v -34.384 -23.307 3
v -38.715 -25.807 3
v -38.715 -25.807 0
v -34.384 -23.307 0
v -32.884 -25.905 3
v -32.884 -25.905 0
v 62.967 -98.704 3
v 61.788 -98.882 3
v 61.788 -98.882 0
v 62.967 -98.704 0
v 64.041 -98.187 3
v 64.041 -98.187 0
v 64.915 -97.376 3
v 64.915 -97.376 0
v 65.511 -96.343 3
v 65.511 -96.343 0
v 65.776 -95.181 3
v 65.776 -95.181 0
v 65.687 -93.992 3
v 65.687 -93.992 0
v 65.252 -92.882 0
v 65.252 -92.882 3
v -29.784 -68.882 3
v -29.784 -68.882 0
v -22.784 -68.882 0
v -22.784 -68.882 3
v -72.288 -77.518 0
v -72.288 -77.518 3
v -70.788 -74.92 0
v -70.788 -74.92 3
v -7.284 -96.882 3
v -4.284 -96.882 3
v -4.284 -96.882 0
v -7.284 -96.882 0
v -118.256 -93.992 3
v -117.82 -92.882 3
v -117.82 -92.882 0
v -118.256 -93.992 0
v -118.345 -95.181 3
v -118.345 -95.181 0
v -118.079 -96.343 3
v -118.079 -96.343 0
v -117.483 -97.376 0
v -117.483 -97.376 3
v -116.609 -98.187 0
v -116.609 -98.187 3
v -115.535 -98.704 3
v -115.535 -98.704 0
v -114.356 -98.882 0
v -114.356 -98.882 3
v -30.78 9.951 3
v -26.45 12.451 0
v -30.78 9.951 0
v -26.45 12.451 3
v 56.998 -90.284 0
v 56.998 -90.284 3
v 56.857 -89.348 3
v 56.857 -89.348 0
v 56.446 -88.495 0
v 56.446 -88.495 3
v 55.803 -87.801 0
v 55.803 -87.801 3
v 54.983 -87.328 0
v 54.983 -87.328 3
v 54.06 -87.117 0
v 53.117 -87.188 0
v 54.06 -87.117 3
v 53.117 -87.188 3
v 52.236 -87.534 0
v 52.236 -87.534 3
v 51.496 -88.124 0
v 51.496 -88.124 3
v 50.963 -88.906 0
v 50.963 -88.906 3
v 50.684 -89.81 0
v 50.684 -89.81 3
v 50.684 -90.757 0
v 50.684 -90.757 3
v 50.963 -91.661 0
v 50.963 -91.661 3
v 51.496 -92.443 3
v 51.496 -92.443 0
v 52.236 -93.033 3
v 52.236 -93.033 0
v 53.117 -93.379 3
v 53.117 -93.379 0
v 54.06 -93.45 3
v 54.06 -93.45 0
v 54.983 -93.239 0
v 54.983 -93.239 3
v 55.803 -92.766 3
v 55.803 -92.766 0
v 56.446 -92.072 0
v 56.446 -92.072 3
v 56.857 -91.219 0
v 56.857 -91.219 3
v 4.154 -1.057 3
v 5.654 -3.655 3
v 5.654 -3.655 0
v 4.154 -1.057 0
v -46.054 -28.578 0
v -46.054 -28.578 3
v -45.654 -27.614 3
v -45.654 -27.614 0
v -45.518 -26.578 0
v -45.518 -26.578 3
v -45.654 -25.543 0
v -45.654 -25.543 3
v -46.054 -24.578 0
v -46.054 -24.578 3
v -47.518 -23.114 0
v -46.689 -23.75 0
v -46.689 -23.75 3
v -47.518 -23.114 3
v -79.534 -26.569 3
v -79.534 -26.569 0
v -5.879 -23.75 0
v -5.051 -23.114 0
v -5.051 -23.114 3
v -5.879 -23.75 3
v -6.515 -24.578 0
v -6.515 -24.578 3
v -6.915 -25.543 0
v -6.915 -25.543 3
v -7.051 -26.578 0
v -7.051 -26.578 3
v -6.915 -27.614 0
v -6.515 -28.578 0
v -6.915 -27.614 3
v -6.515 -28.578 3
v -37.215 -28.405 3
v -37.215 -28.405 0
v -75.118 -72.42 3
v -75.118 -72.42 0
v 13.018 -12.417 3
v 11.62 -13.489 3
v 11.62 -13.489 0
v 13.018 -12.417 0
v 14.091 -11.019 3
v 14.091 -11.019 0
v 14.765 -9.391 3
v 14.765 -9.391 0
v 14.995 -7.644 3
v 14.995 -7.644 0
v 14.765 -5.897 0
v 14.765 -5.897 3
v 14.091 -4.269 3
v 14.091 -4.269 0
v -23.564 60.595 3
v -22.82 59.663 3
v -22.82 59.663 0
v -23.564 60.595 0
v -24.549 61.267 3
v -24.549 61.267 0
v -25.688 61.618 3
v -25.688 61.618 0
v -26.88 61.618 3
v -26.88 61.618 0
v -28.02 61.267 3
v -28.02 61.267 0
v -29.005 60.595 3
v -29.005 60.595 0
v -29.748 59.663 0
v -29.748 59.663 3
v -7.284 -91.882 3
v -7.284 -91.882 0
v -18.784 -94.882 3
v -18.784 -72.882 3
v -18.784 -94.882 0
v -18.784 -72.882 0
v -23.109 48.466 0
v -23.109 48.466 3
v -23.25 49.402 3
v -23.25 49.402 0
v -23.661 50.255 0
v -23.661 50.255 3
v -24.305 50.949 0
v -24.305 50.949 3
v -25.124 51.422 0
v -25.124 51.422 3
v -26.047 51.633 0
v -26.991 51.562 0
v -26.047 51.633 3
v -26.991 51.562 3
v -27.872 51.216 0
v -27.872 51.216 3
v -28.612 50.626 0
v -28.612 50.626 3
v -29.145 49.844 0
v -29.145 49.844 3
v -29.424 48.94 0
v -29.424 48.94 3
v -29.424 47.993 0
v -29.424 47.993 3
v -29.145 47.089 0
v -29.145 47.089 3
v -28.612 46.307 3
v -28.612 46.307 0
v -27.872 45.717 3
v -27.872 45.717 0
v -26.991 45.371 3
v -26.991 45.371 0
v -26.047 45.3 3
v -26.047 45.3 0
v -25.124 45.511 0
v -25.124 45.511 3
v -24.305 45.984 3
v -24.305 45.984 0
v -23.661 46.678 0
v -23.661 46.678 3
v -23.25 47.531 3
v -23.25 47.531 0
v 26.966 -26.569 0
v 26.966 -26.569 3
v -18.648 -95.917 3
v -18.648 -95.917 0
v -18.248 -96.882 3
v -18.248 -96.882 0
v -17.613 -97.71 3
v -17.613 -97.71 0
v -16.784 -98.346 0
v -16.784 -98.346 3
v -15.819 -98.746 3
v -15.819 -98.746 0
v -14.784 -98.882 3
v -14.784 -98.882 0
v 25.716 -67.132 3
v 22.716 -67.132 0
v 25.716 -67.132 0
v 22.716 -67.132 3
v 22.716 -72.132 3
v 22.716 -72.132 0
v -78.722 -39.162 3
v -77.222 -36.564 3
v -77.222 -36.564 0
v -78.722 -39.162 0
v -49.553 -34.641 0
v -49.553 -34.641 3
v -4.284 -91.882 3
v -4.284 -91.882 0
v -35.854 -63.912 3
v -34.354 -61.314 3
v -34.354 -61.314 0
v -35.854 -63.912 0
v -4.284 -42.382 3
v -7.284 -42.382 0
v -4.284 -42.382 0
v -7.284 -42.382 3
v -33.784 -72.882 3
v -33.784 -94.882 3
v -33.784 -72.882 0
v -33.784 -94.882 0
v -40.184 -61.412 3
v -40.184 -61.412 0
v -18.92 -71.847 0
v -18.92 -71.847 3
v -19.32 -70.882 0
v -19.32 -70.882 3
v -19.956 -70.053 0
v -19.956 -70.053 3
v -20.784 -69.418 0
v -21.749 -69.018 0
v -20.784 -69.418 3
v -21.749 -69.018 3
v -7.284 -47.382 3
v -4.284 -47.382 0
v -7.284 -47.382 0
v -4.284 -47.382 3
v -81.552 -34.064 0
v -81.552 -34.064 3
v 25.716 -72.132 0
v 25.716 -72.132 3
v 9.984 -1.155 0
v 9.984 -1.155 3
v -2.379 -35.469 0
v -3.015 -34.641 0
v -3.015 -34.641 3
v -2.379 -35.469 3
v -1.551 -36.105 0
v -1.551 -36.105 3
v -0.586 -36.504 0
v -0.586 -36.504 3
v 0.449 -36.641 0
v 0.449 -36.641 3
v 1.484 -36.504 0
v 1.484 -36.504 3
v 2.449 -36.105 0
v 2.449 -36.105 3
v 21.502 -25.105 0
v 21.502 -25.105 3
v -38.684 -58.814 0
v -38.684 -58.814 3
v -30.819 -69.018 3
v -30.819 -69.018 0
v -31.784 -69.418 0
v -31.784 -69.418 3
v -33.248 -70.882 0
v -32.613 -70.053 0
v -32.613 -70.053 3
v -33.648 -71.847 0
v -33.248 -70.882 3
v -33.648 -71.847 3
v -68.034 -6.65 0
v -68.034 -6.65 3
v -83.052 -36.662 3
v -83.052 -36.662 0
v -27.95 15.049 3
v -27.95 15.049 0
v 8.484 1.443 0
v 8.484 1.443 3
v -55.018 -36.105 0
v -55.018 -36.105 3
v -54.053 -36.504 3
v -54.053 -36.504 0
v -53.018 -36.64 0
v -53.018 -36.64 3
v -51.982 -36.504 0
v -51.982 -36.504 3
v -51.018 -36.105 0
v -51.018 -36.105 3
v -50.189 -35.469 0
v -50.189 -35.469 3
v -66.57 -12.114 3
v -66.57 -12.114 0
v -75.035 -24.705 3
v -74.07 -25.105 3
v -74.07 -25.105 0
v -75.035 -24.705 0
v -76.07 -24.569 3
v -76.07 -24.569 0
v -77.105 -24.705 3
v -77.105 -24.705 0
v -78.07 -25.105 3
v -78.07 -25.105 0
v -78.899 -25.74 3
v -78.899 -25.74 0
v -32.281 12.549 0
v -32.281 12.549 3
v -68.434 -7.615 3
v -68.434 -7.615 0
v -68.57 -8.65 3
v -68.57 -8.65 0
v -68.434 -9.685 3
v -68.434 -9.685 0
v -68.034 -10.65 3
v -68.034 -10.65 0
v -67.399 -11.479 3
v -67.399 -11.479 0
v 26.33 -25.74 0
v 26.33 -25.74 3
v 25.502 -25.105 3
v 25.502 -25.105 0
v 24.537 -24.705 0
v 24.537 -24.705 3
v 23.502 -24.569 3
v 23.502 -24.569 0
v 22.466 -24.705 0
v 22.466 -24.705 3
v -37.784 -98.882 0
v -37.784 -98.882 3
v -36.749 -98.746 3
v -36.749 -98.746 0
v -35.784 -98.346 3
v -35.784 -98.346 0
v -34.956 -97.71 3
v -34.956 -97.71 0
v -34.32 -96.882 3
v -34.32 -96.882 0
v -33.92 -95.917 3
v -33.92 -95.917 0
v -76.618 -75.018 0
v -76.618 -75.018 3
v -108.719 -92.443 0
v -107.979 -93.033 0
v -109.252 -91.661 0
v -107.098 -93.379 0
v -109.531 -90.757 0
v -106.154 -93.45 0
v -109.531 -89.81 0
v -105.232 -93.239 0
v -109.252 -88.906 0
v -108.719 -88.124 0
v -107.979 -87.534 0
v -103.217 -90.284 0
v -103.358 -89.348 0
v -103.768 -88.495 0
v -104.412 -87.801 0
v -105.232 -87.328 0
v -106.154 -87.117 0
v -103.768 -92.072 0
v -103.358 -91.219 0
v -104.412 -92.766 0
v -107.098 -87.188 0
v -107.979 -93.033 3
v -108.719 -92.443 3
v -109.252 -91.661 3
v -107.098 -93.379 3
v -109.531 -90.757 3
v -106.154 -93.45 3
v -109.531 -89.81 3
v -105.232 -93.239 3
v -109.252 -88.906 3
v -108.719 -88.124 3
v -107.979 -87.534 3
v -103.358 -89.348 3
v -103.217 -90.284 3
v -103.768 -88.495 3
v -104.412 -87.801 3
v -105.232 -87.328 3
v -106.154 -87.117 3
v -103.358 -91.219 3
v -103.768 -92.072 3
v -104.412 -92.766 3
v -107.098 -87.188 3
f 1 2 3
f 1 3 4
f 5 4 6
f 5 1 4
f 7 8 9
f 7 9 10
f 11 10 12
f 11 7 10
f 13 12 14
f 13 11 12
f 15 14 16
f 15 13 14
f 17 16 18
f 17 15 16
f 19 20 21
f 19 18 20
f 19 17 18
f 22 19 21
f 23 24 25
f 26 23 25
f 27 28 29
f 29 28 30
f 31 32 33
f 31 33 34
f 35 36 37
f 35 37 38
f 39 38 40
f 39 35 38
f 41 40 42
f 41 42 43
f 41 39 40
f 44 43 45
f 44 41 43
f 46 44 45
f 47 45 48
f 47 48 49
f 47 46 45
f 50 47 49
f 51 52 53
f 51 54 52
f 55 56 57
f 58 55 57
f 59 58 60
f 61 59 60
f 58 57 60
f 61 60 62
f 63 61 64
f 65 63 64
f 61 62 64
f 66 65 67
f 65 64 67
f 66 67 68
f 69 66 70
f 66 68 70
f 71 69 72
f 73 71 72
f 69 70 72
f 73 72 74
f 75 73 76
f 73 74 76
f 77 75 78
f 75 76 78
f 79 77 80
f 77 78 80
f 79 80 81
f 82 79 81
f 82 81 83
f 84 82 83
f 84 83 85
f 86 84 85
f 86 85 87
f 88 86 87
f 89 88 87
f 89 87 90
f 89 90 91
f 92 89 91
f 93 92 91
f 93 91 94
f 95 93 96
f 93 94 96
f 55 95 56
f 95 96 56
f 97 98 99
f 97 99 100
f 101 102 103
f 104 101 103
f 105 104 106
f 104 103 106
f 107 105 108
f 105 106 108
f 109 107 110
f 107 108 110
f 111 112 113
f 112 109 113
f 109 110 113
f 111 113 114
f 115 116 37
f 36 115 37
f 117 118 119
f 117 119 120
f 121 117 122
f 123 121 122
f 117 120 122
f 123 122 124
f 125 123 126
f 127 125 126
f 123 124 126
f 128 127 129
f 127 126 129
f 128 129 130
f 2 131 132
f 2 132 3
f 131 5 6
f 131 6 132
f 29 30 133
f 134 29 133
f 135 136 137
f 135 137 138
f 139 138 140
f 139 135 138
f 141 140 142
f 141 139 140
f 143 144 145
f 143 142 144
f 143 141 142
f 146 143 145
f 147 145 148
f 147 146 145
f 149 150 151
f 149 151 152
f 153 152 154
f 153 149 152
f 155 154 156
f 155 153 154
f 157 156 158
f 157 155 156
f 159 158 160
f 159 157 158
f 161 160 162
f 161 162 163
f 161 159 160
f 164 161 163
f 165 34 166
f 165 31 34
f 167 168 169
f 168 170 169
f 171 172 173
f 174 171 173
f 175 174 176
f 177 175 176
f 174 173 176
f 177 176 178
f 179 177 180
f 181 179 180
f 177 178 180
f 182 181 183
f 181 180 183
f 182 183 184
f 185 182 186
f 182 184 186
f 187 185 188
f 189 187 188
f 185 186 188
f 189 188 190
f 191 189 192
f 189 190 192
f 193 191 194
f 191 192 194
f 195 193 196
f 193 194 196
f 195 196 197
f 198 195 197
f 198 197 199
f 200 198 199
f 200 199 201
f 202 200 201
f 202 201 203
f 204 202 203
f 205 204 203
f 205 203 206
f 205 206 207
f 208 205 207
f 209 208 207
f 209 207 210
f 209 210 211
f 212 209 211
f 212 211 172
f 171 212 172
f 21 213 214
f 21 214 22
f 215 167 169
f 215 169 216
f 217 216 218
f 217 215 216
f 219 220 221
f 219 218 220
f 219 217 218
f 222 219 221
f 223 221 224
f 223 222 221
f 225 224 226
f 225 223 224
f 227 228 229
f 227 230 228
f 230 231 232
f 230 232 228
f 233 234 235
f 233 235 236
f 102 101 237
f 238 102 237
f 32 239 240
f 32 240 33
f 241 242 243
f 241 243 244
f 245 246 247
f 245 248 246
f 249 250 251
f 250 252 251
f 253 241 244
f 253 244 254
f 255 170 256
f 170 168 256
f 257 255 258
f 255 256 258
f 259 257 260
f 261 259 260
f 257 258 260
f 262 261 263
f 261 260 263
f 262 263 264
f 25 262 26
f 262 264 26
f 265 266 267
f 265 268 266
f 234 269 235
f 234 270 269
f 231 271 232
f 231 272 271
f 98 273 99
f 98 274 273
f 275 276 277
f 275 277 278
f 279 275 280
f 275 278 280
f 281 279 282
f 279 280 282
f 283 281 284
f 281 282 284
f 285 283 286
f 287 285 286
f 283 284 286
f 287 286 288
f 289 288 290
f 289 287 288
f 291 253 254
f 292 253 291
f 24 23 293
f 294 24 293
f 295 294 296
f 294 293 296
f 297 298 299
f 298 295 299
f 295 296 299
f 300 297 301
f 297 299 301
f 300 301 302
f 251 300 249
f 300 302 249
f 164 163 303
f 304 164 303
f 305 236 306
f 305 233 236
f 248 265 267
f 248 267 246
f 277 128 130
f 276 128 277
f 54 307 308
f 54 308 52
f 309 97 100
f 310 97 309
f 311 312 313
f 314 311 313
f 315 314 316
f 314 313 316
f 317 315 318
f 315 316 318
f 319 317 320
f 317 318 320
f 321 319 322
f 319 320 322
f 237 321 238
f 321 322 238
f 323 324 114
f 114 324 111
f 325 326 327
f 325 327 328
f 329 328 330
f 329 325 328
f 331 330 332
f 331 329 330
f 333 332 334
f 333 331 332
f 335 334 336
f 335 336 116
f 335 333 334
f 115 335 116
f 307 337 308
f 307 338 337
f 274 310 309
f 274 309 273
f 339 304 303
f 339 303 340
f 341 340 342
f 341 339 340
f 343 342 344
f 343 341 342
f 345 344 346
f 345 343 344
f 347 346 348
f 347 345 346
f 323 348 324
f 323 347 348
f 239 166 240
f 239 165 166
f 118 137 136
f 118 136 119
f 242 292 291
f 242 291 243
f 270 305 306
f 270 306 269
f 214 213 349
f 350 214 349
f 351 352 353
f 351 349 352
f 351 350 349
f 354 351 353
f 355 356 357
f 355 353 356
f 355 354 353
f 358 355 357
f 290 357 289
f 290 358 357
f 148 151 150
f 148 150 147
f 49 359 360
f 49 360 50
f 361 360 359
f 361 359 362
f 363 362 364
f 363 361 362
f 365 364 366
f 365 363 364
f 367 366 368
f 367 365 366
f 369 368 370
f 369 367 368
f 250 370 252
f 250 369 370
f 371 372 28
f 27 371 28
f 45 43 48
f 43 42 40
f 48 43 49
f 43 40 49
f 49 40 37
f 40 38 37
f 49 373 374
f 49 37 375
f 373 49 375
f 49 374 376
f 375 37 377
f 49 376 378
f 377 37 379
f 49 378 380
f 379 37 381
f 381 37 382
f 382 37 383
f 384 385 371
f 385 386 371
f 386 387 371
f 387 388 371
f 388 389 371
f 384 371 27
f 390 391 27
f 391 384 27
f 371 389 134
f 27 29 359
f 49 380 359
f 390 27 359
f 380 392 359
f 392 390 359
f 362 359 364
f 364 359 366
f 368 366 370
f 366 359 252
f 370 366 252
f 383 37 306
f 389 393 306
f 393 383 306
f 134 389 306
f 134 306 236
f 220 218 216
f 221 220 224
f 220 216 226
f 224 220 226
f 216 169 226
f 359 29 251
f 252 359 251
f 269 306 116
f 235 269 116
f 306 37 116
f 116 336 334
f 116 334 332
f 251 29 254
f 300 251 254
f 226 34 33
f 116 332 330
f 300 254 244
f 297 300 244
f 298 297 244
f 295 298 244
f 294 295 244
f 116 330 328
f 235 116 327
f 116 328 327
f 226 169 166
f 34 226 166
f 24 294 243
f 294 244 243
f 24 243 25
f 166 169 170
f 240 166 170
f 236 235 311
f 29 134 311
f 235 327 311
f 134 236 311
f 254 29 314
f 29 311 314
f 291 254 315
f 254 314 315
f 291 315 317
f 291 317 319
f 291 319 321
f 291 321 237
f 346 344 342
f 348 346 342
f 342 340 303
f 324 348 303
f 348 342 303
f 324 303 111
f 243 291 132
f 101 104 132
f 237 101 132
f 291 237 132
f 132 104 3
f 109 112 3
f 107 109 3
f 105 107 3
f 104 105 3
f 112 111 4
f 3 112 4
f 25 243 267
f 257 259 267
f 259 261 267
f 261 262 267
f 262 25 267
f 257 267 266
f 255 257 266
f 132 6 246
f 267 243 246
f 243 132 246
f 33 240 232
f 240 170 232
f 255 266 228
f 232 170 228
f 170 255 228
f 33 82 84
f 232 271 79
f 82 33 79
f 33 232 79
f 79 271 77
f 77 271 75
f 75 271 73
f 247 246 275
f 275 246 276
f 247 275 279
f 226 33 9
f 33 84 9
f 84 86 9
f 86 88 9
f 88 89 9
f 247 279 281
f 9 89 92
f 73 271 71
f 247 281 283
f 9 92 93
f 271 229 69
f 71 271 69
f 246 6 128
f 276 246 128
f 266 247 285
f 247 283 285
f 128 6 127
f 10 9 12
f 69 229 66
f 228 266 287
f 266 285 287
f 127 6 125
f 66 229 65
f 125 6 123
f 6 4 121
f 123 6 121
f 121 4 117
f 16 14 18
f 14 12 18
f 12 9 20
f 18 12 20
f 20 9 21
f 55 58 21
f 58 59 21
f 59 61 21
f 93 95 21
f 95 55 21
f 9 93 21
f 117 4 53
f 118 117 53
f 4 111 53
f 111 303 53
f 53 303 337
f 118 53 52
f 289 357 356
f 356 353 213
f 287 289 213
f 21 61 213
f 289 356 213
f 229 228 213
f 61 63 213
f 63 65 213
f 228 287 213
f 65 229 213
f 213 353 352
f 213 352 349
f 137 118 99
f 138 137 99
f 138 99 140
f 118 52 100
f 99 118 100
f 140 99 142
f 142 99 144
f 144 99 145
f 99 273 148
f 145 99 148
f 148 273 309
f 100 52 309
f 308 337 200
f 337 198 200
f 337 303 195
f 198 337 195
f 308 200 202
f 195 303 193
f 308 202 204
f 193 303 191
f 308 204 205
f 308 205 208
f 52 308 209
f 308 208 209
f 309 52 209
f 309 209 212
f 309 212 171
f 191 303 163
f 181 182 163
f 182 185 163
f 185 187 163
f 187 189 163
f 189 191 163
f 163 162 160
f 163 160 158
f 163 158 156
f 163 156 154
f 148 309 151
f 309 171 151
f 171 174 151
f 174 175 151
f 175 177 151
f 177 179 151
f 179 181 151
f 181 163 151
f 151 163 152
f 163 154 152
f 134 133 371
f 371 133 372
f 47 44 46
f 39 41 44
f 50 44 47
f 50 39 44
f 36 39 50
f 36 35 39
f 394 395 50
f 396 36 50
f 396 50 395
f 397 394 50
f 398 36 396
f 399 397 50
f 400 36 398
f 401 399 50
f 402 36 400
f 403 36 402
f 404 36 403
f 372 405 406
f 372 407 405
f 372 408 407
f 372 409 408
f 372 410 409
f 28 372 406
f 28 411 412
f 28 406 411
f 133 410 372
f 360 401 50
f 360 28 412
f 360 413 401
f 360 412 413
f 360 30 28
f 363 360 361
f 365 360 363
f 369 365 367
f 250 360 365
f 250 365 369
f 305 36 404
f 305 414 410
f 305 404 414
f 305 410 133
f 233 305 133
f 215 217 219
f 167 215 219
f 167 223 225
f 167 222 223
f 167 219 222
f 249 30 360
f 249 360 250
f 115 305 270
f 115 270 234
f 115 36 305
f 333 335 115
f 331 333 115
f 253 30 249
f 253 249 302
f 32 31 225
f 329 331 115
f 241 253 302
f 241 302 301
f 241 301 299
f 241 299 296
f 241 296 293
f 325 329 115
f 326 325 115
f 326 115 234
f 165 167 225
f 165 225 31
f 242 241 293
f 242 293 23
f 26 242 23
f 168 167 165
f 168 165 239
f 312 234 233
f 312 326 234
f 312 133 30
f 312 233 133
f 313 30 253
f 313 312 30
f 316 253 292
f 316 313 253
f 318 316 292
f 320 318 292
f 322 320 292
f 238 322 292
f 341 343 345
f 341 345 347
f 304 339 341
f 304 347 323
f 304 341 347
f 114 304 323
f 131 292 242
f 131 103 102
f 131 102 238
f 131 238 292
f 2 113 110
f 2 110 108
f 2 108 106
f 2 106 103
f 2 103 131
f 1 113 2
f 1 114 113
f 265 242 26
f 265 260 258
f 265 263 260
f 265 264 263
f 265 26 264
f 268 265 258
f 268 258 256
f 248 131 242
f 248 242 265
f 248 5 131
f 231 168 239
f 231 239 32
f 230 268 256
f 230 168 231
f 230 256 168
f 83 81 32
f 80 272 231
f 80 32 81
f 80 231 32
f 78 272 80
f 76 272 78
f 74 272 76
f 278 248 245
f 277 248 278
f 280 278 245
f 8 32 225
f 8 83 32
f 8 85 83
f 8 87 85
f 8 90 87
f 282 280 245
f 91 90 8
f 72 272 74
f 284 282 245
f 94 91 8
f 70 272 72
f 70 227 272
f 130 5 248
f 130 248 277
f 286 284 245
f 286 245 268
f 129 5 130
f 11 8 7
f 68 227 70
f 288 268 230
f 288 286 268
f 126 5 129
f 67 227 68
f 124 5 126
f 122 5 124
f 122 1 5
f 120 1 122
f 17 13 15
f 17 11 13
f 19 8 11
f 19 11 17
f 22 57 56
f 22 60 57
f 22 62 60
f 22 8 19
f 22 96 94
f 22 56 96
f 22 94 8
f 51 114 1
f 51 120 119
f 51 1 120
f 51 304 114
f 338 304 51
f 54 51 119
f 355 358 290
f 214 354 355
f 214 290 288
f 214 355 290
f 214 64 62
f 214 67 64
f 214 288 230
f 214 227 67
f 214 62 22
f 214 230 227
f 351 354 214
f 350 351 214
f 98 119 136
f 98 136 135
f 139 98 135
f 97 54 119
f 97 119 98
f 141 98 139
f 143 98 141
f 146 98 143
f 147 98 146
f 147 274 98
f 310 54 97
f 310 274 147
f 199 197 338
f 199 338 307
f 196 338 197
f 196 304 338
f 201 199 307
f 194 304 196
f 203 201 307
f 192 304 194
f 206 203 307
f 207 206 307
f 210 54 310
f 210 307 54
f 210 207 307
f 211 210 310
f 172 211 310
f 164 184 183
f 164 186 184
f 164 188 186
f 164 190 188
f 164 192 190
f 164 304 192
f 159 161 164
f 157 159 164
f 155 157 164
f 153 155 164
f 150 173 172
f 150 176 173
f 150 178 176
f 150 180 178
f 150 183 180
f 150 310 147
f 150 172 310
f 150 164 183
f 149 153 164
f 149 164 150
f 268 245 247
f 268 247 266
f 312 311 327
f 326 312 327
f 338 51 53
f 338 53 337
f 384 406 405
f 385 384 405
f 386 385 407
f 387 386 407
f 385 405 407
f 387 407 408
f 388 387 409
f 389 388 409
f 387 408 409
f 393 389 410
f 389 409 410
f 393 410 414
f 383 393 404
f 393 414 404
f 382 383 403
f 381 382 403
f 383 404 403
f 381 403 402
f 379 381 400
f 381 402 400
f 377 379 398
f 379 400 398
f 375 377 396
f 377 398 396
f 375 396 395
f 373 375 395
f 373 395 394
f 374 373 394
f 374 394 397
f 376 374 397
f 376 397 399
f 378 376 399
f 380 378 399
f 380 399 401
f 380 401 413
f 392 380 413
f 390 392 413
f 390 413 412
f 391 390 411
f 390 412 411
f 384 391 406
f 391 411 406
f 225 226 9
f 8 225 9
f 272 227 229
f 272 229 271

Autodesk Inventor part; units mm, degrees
ref_plane "YZ Plane" through (0, 0, 0) normal (1, 0, 0) x (0, 1, 0)
ref_plane "XZ Plane" through (0, 0, 0) normal (0, 1, 0) x (-1, 0, 0)
ref_plane "XY Plane" through (0, 0, 0) normal (0, 0, 1) x (1, 0, 0)
sketch "Sketch1" plane through (0, 0, 0) normal (0, 0, 1) x (1, 0, 0)
  line L0 (68.7158, -98.8819) -> (-121.2842, -98.8819) construction
  line L1 (-121.2842, -98.8819) -> (-26.2842, 65.663) construction
  line L2 (-26.2842, 65.663) -> (-26.2842, -98.8819) construction
  line L3 (68.7158, -98.8819) -> (-73.7842, -16.6094) construction
  line L4 (-33.7842, -98.8819) -> (-33.7842, -68.8819)
  line L5 (-33.7842, -68.8819) -> (-18.7842, -68.8819)
  line L6 (-18.7842, -68.8819) -> (-18.7842, -98.8819)
  line L7 (-70.0342, -10.1143) -> (-44.0535, -25.1143)
  line L8 (-44.0535, -25.1143) -> (-51.5535, -38.1046)
  line L9 (-51.5535, -38.1046) -> (-77.5342, -23.1046)
  line L10 (-77.5342, -23.1046) -> (-121.2842, -98.8819)
  line L11 (-33.7842, -98.8819) -> (-121.2842, -98.8819)
  line L12 (-18.7842, -98.8819) -> (68.7158, -98.8819)
  line L13 (-26.2842, 65.663) -> (-70.0342, -10.1143)
  line L14 (-121.2842, -98.8819) -> (17.4658, -18.7745) construction
  line L15 (-26.2842, 65.663) -> (68.7158, -98.8819) construction
  line L16 (17.4658, -10.1143) -> (-8.515, -25.1143)
  line L17 (-8.515, -25.1143) -> (-1.015, -38.1046)
  line L18 (-1.015, -38.1046) -> (24.9658, -23.1046)
  line L19 (-26.2842, 65.663) -> (17.4658, -10.1143)
  line L20 (24.9658, -23.1046) -> (68.7158, -98.8819)
  point P0 (-26.2842, -44.0336)
  point P1 (-26.2842, -44.0336)
  dimension "d3" = 190
  dimension "d6" = 7.5
  dimension "d7" = 15
  dimension "d8" = 30
  dimension "d9" = 15
  dimension "d10" = 7.5
  dimension "d16" = 30
  dimension "d18" = 15
  dimension "d19" = 7.5
  dimension "d20" = 30
extrude "Extrusion2" add sketch "Sketch1" along normal blind 3
fillet "Fillet1" radius 6.75 1 edges at (17.4658, -10.1143, 1.5)
fillet "Fillet2" radius 4 14 edges at (-8.515, -25.1143, 1.5) (24.9658, -23.1046, 1.5) (-1.015, -38.1046, 1.5) (-33.7842, -98.8819, 1.5) (-33.7842, -68.8819, 1.5) (-18.7842, -98.8819, 1.5) (68.7158, -98.8819, 1.5) (-18.7842, -68.8819, 1.5) (-121.2842, -98.8819, 1.5) (-70.0342, -10.1143, 1.5) (-44.0535, -25.1143, 1.5) (-51.5535, -38.1046, 1.5) (-77.5342, -23.1046, 1.5) (-26.2842, 65.663, 1.5)
sketch "Sketch3" plane through (0, 0, 3) normal (0, 0, 1) x (1, 0, 0)
  line L0 (61.7876, -98.8819) -> (-14.7842, -98.8819) projected
  line L1 (-7.2842, -91.8819) -> (-4.2842, -91.8819)
  line L2 (-4.2842, -91.8819) -> (-4.2842, -96.8819)
  line L3 (-4.2842, -96.8819) -> (-7.2842, -96.8819)
  line L4 (-7.2842, -96.8819) -> (-7.2842, -91.8819)
  line L5 (-18.7842, -94.8819) -> (-18.7842, -72.8819) projected
  line L6 (-7.2842, -42.3819) -> (-4.2842, -42.3819)
  line L7 (-4.2842, -42.3819) -> (-4.2842, -47.3819)
  line L8 (-4.2842, -47.3819) -> (-7.2842, -47.3819)
  line L9 (-7.2842, -47.3819) -> (-7.2842, -42.3819)
  line L10 (-74.0701, -25.1046) -> (-55.0176, -36.1046) projected
  line L11 (-117.8201, -92.8819) -> (-79.5342, -26.5687) projected
  line L12 (11.6201, -13.4893) -> (-5.0509, -23.1143) projected
  line L13 (-22.8201, 59.663) -> (14.0908, -4.2686) projected
  line L14 (-34.3845, -23.3069) -> (-32.8845, -25.905)
  line L15 (-32.8845, -25.905) -> (-37.2146, -28.405)
  line L16 (-37.2146, -28.405) -> (-38.7146, -25.8069)
  line L17 (-38.7146, -25.8069) -> (-34.3845, -23.3069)
  line L18 (8.4837, 1.4431) -> (9.9837, -1.155)
  line L19 (9.9837, -1.155) -> (5.6536, -3.655)
  line L20 (5.6536, -3.655) -> (4.1536, -1.0569)
  line L21 (4.1536, -1.0569) -> (8.4837, 1.4431)
  line L22 (-40.1839, -61.412) -> (-38.6839, -58.8139)
  line L23 (-38.6839, -58.8139) -> (-34.3538, -61.3139)
  line L24 (-34.3538, -61.3139) -> (-35.8538, -63.912)
  line L25 (-35.8538, -63.912) -> (-40.1839, -61.412)
  line L26 (-83.0522, -36.662) -> (-81.5522, -34.0639)
  line L27 (-81.5522, -34.0639) -> (-77.222, -36.5639)
  line L28 (-77.222, -36.5639) -> (-78.722, -39.162)
  line L29 (-78.722, -39.162) -> (-83.0522, -36.662)
  line L30 (22.7158, -67.1319) -> (25.7158, -67.1319)
  line L31 (25.7158, -67.1319) -> (25.7158, -72.1319)
  line L32 (25.7158, -72.1319) -> (22.7158, -72.1319)
  line L33 (22.7158, -72.1319) -> (22.7158, -67.1319)
  line L34 (-49.5535, -34.6405) -> (-46.0535, -28.5784) projected
  line L35 (-6.515, -28.5784) -> (-3.015, -34.6405) projected
  line L36 (-30.7805, 9.9508) -> (-32.2805, 12.5489)
  line L37 (-32.2805, 12.5489) -> (-27.9504, 15.0489)
  line L38 (-27.9504, 15.0489) -> (-26.4504, 12.4508)
  line L39 (-26.4504, 12.4508) -> (-30.7805, 9.9508)
  line L40 (-75.118, -72.4197) -> (-76.618, -75.0178)
  line L41 (-76.618, -75.0178) -> (-72.2879, -77.5178)
  line L42 (-72.2879, -77.5178) -> (-70.7879, -74.9197)
  line L43 (-70.7879, -74.9197) -> (-75.118, -72.4197)
  line L44 (-68.0342, -6.6502) -> (-29.7483, 59.663) projected
  line L45 (-47.5176, -23.1143) -> (-66.5701, -12.1143) projected
  line L46 (26.9658, -26.5687) -> (65.2517, -92.8819) projected
  line L47 (-61.1393, 5.2922) -> (-129.5703, -113.2338) construction
  line L48 (-129.5703, -98.8819) -> (82.7932, -98.8819) construction
  line L49 (71.7222, -104.0892) -> (-26.7217, 66.4208) construction
  line L50 (-61.1393, 5.2922) -> (-24.7647, 68.2948) construction
  line L51 (-26.2842, 65.663) -> (-26.2842, -98.8819) construction
  line L52 (68.7158, -98.8819) -> (-73.7842, -16.6094) construction
  line L53 (-121.2842, -98.8819) -> (21.2158, -16.6094) construction
  circle A0 centre (-26.2842, -44.0336) radius 92.5 construction
  circle A1 centre (53.8231, -90.2836) radius 3.175
  circle A2 centre (-106.3916, -90.2836) radius 3.175
  circle A3 centre (-26.2842, 48.4664) radius 3.175
  point P0 (0, 0)
  dimension "d35" = 3
  dimension "d36" = 5
  dimension "d38" = 2
  dimension "d41" = 11.5
  dimension "d42" = 3
  dimension "d43" = 5
  dimension "d44" = 44.5
  dimension "d45" = 3
  dimension "d46" = 5
  dimension "d47" = 3
  dimension "d48" = 5
  dimension "d49" = 44.5
  dimension "d50" = 3
  dimension "d51" = 5
  dimension "d52" = 3
  dimension "d53" = 5
  dimension "d54" = 44.5
  dimension "d55" = 2
  dimension "d56" = 11.5
  dimension "d57" = 11.5
  dimension "d58" = 2
  dimension "d59" = 3
  dimension "d60" = 5
  dimension "d61" = 19.75
  dimension "d62" = 30
  dimension "d63" = 5
  dimension "d64" = 3
  dimension "d65" = 30
  dimension "d66" = 19.75
  dimension "d67" = 3
  dimension "d68" = 5
  dimension "d69" = 19.75
  dimension "d70" = 30
  dimension "d72" = 185
  dimension "d73" = 6.35
  dimension "d74" = 6.35
  dimension "d75" = 6.35
extrude "Extrusion4" cut sketch "Sketch3" against normal blind 3
equation "\"d6\" = 0.5 * d7"
equation "\"d9\" = d7"
equation "\"d10\" = d6"
equation "\"d16\" = d15"
equation "\"d18\" = d7"
equation "\"d19\" = d6"
equation "\"d20\" = d16"
equation "\"d55\" = d38"
equation "\"d56\" = d41"
equation "\"d57\" = d56"
equation "\"d58\" = d38"
equation "\"d61\" = 0.5 * d44 - 0.5 * d60"
equation "\"d65\" = d62"
equation "\"d66\" = d61"
equation "\"d69\" = d61"
equation "\"d70\" = d62"
equation "\"d15\" = d8"
properties part number "base"
